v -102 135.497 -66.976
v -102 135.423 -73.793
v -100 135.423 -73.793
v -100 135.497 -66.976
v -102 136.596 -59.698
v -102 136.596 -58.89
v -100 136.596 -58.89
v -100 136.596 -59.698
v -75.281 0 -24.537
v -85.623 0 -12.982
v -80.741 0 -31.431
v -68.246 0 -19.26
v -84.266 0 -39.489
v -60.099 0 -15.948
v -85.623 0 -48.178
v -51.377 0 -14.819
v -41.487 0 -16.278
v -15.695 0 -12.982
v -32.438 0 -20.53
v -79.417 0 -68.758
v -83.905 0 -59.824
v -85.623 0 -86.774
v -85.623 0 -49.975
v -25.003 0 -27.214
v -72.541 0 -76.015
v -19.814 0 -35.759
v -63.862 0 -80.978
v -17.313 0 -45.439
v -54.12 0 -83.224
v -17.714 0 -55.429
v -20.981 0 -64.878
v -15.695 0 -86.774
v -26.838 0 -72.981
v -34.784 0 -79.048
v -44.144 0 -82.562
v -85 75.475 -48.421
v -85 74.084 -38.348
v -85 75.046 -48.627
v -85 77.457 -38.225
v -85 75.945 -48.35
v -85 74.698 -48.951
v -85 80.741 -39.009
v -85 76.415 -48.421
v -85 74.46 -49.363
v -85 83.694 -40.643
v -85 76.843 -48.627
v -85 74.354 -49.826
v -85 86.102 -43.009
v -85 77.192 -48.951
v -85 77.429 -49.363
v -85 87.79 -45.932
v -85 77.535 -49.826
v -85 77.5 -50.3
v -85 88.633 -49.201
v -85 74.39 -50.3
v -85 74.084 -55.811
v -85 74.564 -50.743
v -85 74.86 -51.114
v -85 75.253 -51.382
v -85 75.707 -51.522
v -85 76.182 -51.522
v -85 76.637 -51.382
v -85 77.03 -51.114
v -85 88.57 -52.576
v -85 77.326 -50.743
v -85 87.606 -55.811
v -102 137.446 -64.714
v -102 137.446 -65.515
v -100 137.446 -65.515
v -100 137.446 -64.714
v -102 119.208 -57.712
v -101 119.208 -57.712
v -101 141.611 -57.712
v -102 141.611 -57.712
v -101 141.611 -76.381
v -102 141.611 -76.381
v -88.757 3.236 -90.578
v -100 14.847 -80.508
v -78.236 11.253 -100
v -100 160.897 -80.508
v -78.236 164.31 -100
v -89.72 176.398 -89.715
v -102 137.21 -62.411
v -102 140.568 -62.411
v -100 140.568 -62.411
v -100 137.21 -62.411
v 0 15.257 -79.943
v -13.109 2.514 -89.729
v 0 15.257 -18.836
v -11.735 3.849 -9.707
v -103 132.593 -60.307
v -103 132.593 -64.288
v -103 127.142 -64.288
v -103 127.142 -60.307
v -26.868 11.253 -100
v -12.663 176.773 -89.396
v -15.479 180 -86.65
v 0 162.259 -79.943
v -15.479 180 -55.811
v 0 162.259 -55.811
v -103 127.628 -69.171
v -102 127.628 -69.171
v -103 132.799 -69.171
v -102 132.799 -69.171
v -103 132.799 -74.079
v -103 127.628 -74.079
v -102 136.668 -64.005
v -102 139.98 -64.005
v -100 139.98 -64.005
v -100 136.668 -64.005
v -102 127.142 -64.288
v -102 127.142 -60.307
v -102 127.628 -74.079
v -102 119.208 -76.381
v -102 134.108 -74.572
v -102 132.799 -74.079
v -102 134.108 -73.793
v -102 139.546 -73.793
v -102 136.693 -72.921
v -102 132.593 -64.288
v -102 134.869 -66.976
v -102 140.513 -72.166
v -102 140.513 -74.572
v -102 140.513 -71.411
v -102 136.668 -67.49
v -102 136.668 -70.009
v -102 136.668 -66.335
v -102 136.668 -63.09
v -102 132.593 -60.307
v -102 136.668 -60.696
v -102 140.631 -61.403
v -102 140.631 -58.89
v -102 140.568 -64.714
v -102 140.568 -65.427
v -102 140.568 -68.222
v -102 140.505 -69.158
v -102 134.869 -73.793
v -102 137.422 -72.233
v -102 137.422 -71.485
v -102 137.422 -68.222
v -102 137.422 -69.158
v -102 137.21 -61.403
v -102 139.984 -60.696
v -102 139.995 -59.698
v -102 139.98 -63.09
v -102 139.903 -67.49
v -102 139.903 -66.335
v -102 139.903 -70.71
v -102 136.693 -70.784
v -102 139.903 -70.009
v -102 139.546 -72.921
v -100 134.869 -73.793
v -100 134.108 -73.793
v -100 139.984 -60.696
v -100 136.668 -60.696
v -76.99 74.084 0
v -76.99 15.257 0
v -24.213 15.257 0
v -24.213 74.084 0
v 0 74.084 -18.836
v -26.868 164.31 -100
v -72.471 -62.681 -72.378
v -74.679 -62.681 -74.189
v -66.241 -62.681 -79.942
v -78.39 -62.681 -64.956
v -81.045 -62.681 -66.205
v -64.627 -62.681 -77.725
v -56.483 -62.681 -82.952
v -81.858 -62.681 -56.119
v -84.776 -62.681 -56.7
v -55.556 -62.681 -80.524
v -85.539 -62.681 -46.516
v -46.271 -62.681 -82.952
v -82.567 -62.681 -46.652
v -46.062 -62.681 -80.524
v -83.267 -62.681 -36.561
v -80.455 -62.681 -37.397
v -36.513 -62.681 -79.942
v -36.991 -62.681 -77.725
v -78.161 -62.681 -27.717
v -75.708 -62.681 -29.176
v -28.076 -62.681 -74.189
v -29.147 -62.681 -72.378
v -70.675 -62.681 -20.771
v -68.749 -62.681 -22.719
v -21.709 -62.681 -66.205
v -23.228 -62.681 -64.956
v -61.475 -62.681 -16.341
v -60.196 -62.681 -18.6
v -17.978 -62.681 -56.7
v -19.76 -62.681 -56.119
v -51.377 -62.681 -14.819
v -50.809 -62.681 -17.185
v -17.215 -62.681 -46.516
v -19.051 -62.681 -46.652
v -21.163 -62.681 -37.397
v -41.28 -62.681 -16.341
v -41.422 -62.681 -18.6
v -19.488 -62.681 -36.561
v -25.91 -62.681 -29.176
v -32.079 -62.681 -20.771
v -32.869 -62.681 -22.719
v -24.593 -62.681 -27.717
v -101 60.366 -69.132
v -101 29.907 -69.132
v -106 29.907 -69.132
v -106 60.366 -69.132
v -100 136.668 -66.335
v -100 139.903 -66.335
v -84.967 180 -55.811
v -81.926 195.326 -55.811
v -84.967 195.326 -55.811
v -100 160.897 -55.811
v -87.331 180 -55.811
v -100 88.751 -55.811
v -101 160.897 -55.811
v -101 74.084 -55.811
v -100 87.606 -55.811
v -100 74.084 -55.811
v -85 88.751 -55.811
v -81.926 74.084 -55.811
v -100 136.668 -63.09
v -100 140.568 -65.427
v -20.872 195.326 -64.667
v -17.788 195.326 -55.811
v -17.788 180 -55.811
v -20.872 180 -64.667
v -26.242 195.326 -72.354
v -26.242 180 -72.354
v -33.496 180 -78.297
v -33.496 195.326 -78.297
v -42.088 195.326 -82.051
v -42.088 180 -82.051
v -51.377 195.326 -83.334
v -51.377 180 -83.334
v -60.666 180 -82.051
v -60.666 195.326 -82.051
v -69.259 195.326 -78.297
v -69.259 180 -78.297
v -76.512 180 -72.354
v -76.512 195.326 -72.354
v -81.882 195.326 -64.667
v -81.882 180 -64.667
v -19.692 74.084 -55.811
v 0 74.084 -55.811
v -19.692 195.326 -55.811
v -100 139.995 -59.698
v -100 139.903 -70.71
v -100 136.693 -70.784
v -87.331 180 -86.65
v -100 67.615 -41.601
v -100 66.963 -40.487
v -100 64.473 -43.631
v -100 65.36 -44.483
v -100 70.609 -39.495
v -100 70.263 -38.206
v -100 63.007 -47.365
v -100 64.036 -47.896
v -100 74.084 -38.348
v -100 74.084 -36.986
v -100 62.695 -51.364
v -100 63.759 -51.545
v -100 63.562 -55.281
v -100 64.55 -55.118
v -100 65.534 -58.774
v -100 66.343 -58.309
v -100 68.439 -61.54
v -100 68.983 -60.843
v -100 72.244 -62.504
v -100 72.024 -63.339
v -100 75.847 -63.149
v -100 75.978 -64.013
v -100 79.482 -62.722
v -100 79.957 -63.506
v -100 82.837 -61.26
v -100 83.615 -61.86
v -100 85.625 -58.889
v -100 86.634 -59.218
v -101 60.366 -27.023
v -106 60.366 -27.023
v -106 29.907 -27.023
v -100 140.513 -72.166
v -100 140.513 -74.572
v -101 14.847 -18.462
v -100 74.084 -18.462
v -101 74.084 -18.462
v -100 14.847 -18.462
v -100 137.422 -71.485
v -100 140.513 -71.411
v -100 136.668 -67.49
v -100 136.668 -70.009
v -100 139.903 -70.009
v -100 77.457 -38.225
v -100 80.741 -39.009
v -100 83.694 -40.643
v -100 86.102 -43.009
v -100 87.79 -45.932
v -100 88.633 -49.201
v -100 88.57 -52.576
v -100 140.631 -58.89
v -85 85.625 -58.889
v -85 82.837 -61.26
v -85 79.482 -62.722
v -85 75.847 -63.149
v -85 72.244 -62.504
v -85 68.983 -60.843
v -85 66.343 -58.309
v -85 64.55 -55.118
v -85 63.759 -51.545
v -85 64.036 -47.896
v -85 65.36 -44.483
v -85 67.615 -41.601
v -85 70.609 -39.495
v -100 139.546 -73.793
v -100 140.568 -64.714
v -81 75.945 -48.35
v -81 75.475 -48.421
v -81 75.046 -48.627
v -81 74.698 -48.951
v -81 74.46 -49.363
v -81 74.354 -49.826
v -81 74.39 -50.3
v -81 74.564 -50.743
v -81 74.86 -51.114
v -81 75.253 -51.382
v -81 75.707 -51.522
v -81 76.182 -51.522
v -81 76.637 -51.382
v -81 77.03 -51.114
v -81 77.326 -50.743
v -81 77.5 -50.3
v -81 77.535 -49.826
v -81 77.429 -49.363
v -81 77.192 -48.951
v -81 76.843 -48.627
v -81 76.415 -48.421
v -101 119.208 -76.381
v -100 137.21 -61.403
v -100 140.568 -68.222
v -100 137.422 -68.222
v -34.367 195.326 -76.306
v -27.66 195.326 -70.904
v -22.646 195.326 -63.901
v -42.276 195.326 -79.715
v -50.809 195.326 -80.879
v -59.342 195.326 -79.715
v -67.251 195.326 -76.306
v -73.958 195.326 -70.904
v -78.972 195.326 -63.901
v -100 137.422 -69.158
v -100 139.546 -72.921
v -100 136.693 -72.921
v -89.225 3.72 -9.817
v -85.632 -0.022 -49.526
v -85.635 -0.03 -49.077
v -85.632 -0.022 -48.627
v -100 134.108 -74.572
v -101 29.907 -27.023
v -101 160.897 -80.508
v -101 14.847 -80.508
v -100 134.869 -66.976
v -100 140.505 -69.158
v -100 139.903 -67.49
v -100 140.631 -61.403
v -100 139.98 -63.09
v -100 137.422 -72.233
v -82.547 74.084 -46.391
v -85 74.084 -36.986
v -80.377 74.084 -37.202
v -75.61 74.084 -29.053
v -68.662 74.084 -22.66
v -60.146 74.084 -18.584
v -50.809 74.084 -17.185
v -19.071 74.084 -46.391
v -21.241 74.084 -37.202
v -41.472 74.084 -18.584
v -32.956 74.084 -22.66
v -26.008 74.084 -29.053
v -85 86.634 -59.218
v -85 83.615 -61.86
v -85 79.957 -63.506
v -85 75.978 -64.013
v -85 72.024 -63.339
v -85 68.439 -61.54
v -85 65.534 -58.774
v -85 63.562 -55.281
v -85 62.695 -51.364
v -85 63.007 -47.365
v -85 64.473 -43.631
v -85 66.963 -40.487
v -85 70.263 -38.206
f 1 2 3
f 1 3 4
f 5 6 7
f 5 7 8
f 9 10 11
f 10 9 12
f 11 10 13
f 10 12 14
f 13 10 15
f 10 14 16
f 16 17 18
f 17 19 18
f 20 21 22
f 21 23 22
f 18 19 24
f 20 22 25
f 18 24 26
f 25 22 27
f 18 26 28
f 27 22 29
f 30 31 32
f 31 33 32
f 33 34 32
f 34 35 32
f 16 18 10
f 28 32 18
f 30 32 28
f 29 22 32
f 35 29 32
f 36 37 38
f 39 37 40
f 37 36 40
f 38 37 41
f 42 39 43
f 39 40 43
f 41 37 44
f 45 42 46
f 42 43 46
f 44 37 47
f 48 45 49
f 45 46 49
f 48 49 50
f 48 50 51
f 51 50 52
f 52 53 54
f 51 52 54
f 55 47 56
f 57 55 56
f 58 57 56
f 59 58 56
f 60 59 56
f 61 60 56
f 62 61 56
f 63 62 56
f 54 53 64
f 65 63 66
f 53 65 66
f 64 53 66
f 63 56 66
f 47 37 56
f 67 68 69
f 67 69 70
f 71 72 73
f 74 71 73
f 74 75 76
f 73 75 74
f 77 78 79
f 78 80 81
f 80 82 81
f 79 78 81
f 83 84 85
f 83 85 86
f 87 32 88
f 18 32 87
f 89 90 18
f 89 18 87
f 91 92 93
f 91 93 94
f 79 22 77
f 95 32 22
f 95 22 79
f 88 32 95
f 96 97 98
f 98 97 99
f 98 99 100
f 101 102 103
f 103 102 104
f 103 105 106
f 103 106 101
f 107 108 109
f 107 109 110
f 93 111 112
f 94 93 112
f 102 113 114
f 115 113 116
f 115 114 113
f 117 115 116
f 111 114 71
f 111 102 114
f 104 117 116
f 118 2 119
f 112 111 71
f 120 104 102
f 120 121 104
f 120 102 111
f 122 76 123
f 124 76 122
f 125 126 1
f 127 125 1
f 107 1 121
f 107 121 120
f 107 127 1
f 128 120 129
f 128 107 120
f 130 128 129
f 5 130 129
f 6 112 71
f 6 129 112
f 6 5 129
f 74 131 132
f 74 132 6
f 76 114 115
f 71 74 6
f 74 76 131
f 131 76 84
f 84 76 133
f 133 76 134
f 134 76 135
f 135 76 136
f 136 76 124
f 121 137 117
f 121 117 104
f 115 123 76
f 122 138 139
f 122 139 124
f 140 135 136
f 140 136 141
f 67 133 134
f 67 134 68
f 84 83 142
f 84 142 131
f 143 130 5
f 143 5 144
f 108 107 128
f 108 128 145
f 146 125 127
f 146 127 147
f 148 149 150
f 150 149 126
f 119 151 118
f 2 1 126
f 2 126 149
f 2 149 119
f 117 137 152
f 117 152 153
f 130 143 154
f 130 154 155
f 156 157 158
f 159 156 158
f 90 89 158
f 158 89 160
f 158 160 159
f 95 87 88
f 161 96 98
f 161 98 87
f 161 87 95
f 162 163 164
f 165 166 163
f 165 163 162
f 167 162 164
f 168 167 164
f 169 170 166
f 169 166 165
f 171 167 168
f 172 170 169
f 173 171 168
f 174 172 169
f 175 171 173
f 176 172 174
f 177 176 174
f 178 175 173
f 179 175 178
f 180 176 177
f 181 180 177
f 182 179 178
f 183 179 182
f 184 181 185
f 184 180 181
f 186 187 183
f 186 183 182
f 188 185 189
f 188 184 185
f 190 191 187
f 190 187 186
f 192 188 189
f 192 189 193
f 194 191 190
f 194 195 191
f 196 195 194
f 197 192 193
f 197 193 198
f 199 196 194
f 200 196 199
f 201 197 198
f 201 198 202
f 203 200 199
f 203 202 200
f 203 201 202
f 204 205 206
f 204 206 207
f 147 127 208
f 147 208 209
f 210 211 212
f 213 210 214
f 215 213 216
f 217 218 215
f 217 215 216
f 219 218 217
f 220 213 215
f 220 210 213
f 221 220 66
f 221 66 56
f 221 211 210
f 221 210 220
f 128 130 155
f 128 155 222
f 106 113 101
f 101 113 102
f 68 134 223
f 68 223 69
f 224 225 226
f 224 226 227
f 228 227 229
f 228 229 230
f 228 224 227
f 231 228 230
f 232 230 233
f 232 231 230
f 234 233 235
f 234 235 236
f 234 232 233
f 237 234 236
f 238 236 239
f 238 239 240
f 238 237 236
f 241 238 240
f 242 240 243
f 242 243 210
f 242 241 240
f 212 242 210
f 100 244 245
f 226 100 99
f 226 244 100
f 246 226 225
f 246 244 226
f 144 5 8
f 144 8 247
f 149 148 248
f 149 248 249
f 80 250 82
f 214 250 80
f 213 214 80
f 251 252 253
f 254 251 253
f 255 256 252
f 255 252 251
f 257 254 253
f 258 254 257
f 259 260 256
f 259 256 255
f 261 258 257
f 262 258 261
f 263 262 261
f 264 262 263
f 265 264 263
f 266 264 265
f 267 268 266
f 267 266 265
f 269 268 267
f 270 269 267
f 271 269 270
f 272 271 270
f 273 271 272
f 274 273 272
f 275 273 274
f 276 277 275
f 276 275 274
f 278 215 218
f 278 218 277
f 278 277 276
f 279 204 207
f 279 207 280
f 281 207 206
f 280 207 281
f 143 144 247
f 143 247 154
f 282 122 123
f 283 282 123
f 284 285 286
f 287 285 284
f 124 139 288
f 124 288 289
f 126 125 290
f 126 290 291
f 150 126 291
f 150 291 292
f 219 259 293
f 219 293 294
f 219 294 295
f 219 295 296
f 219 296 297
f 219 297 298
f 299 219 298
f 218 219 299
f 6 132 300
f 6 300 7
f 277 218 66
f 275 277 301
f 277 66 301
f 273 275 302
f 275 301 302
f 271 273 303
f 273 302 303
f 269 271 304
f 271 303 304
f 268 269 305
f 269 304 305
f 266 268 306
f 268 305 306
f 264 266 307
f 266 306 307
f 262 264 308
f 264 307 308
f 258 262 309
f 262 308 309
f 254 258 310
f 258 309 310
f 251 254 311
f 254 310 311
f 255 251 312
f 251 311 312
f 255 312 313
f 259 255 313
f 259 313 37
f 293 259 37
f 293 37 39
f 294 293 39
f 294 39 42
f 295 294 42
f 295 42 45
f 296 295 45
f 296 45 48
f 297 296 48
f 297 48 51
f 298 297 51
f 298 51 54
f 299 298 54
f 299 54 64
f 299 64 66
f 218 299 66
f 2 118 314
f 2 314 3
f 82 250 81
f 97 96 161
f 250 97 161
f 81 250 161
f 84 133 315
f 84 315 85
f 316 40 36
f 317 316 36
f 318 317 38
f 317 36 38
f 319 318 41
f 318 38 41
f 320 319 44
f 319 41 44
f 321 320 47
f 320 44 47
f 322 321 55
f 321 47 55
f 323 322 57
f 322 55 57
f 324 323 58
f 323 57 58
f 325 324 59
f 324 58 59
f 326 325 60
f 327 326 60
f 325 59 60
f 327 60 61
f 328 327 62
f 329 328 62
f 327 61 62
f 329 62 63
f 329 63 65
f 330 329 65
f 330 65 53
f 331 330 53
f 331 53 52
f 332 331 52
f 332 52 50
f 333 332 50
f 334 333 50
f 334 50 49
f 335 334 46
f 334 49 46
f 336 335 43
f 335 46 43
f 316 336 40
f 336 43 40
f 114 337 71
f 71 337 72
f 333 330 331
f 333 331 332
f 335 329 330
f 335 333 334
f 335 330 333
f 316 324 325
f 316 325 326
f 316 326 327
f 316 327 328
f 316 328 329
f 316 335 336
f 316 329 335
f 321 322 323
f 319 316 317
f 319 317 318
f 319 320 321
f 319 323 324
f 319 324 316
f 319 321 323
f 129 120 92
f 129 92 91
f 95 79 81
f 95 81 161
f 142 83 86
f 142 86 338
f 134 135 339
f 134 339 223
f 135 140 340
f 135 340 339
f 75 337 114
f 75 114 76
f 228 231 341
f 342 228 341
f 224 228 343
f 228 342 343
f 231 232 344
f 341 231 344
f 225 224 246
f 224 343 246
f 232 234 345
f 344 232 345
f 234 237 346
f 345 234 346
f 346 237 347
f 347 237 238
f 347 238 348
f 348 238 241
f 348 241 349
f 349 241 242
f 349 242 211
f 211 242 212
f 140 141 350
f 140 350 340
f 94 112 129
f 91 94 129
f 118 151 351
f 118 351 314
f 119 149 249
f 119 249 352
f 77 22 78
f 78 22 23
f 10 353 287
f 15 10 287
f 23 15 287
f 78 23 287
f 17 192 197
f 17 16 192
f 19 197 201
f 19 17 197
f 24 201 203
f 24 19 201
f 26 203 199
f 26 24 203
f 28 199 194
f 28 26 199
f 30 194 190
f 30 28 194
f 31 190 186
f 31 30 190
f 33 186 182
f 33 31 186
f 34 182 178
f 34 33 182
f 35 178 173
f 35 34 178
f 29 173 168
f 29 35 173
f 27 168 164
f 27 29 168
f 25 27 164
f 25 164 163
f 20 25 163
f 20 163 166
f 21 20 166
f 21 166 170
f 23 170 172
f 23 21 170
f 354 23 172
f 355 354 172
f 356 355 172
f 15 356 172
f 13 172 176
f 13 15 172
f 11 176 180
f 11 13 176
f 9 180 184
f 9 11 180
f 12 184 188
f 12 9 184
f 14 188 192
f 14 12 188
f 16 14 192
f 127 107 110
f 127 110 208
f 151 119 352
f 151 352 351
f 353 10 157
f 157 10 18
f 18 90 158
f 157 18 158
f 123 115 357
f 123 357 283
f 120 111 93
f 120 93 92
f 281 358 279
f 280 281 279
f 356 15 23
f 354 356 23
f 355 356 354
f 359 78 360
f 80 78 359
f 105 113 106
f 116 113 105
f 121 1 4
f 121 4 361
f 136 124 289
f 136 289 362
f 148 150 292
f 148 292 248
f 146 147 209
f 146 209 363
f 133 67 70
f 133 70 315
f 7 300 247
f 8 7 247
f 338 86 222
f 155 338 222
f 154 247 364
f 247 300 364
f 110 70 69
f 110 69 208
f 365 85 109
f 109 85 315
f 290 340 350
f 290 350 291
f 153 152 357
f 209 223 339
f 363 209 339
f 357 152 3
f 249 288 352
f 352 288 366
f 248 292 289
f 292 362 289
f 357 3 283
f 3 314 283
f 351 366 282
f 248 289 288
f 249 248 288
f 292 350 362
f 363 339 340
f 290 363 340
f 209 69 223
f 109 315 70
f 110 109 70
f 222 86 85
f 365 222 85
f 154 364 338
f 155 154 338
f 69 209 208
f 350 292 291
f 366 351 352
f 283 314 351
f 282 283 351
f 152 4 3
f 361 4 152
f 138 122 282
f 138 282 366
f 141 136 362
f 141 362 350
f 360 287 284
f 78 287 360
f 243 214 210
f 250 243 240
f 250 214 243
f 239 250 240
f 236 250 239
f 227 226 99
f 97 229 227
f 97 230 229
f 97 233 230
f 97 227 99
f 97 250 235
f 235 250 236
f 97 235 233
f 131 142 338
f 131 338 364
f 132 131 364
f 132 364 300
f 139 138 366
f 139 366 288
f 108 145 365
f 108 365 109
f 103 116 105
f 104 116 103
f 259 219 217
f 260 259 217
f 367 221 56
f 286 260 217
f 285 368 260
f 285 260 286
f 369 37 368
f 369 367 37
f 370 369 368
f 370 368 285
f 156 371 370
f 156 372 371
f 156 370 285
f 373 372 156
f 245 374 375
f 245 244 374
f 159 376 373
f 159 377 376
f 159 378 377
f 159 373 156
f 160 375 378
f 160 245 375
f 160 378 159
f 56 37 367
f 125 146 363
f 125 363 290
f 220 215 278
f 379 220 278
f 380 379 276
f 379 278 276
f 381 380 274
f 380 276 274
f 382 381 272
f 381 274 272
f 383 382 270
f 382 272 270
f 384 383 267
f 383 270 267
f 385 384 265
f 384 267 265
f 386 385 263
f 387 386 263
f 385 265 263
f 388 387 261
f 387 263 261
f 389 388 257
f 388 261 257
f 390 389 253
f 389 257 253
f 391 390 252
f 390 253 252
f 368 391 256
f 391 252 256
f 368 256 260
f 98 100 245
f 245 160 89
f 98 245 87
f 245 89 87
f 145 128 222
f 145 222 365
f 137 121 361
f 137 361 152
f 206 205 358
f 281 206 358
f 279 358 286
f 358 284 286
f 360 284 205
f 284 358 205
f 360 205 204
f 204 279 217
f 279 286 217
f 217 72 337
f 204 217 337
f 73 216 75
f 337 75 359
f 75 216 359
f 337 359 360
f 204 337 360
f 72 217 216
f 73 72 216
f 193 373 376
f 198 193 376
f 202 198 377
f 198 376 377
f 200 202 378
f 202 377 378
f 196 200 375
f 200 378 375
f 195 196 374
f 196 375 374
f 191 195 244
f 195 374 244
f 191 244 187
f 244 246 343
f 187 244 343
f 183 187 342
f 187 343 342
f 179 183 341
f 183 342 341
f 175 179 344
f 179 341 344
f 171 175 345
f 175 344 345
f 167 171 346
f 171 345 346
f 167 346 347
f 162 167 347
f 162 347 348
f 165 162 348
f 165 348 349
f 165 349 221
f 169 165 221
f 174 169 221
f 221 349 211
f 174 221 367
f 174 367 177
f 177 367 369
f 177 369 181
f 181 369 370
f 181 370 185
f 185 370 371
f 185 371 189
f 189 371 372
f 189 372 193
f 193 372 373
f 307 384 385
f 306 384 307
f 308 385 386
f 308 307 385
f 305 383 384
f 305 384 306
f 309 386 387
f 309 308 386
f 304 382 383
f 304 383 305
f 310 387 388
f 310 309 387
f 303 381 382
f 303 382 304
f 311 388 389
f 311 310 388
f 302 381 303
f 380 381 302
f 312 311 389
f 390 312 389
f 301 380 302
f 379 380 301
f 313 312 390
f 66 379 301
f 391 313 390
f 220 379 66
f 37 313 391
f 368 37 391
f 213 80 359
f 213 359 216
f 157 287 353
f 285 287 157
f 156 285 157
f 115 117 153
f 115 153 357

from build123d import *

# Parameters (mm, degrees)
SKETCH1_W           = 100
SKETCH1_H           = 100
BOSS_EXTRUDE1_DEPTH = 180
SKETCH2_R           = 34.257790197
BOSS_EXTRUDE2_DEPTH = 350
SKETCH3_W           = 152.006357392
SKETCH3_H           = 282.452416457
CUT_EXTRUDE2_DEPTH  = 400
CUT_EXTRUDE3_DEPTH  = 400
CUT_EXTRUDE4_DEPTH  = 400
CUT_EXTRUDE5_DEPTH  = 400
SKETCH7_W           = 160.159381639
SKETCH7_H           = 147.362276113
CUT_EXTRUDE6_DEPTH  = 400
SKETCH8_W           = 147.310744502
SKETCH8_H           = 162.038906966
CUT_EXTRUDE7_DEPTH  = 400
SKETCH9_R           = 31.847293423
CUT_EXTRUDE8_DEPTH  = 400
SKETCH10_W          = 140.220962397
SKETCH10_H          = 212.033531124
CUT_EXTRUDE9_DEPTH  = 400
SKETCH11_R          = 13.603137886
CUT_EXTRUDE11_DEPTH = 15
SKETCH12_R          = 12.495422516
BOSS_EXTRUDE3_DEPTH = 15
SKETCH13_R          = 1.594865099
BOSS_EXTRUDE4_DEPTH = 4
SKETCH14_W          = 100.74862993
SKETCH14_H          = 110.555003588
CUT_EXTRUDE13_DEPTH = 400
BOSS_EXTRUDE5_DEPTH = 1
SKETCH16_W          = 42.108585165
SKETCH16_H          = 30.458347221
BOSS_EXTRUDE6_DEPTH = 5
SKETCH17_W          = 18.669530869
SKETCH17_H          = 22.4027039
BOSS_EXTRUDE7_DEPTH = 1
SKETCH18_W          = 4.907623399
SKETCH18_H          = 5.170746831
SKETCH18_W_2        = 3.981473695
SKETCH18_H_2        = 5.451349552
BOSS_EXTRUDE8_DEPTH = 1
CUT_EXTRUDE14_DEPTH = 2


with BuildPart() as part:
    # Sketch1 → Boss-Extrude1 (new body)
    with BuildSketch(Plane(origin=(0, 0, 0), x_dir=(1, 0, 0), z_dir=(0, 1, 0))):
        with Locations((-50, 50)):
            Rectangle(SKETCH1_W, SKETCH1_H)
    extrude(amount=BOSS_EXTRUDE1_DEPTH)

    # Sketch2 → Boss-Extrude2 (add, symmetric)
    with BuildSketch(Plane(origin=(0, 180, 0), x_dir=(1, 0, 0), z_dir=(0, 1, 0))):
        with Locations(Location((-51.377291833, 49.076536384, 0), (0, 0, 270))):
            Circle(SKETCH2_R)
    extrude(amount=BOSS_EXTRUDE2_DEPTH, both=True)

    # Sketch3 → Cut-Extrude2 (cut)
    with BuildSketch(Plane(origin=(0, 0, 0), x_dir=(0, 0, -1), z_dir=(1, 0, 0))):
        with Locations((57.419900112, 502.274302507)):
            Rectangle(SKETCH3_W, SKETCH3_H)
    extrude(amount=-CUT_EXTRUDE2_DEPTH, mode=Mode.SUBTRACT)

    # Sketch4 → Cut-Extrude3 (cut)
    with BuildSketch(Plane(origin=(0, 0, 0), x_dir=(0, 0, -1), z_dir=(1, 0, 0))):
        Polygon((12.981970869, 0), (-8.994244796, 25.828096003), (-18.564506014, -15.259465835), align=None)
        Polygon((85.072517936, -1.448103984), (109.237639161, 19.113145112), (115.920034239, -3.267382694), align=None)
        Polygon((12.981970869, 180), (-8.994244796, 148.537596011), (-15.418178585, 193.219274892), align=None)
        Polygon((85.072517936, 181.854312784), (103.841225373, 159.795920888), (106.132549481, 198.647393934), align=None)
    extrude(amount=-CUT_EXTRUDE3_DEPTH, mode=Mode.SUBTRACT)

    # Sketch5 → Cut-Extrude4 (cut)
    with BuildSketch(Plane.XY):
        Polygon((-85.623287335, 0), (-106.370377984, 21.426392531), (-122.288861874, 3.209259887), (-93.526345261, -19.884701759), align=None)
        Polygon((-15.694988751, 0), (0, 15.257385304), (12.122677088, 15.257385304), (10.563067769, -19.884701759), align=None)
        Polygon((-87.166490339, 180.248071029), (-106.370377984, 151.29108453), (-117.705469457, 200.501115102), align=None)
        Polygon((-15.694988751, 180.248071029), (7.833767065, 153.279557508), (0, 193.941208308), align=None)
    extrude(amount=-CUT_EXTRUDE4_DEPTH, mode=Mode.SUBTRACT)

    # Sketch6 → Cut-Extrude5 (cut)
    with BuildSketch(Plane(origin=(0, 180, 0), x_dir=(1, 0, 0), z_dir=(0, 1, 0))):
        Polygon((-112.386997555, 28.400400964), (-64.261264503, -10.212759359), (-84.406366528, -15.51192827), (-124.649689542, -15.51192827), align=None)
        Polygon((-97.065537028, 135.861756084), (-119.37552445, 77.792688888), (-118.043343626, 64.347606737), (-66.428694172, 110.575168787), align=None)
        Polygon((-24.69640689, -21.815840769), (11.092108798, -8.97361337), (17.428316417, 32.393768119), (-38.531576846, -11.139157378), align=None)
        Polygon((-17.445484601, 140.804394854), (35.417473102, 107.262520599), (9.305452855, 72.996438725), (-31.724385352, 103.625272537), align=None)
    extrude(amount=-CUT_EXTRUDE5_DEPTH, mode=Mode.SUBTRACT)

    # Sketch7 → Cut-Extrude6 (cut)
    with BuildSketch(Plane.XY):
        with Locations((-66.123258915, -136.36252694)):
            Rectangle(SKETCH7_W, SKETCH7_H)
    extrude(amount=-CUT_EXTRUDE6_DEPTH, mode=Mode.SUBTRACT)

    # Sketch8 → Cut-Extrude7 (cut)
    with BuildSketch(Plane.XY):
        with Locations((-53.541153336, 332.448287589)):
            Rectangle(SKETCH8_W, SKETCH8_H)
    extrude(amount=-CUT_EXTRUDE7_DEPTH, mode=Mode.SUBTRACT)

    # Sketch9 → Cut-Extrude8 (cut)
    with BuildSketch(Plane(origin=(0, 251.428834106, 0), x_dir=(1, 0, 0), z_dir=(0, 1, 0))):
        with Locations(Location((-50.808993157, 49.032036374, 0), (0, 0, 270))):
            Circle(SKETCH9_R)
    extrude(amount=-CUT_EXTRUDE8_DEPTH, mode=Mode.SUBTRACT)

    # Sketch10 → Cut-Extrude9 (cut)
    with BuildSketch(Plane.ZY.offset(100)):
        with Locations((14.299084536, 180.100625535)):
            Rectangle(SKETCH10_W, SKETCH10_H)
    extrude(amount=-CUT_EXTRUDE9_DEPTH, mode=Mode.SUBTRACT)

    # Sketch11 → Cut-Extrude11 (cut)
    with BuildSketch(Plane.ZY.offset(100)):
        with Locations((-50.413251954, 76.264646142)):
            Circle(SKETCH11_R)
    extrude(amount=-CUT_EXTRUDE11_DEPTH, mode=Mode.SUBTRACT)

    # Sketch12 → Boss-Extrude3 (add)
    with BuildSketch(Plane.ZY.offset(85)):
        with Locations(Location((-50.658800768, 76.222522328, 0), (0, 0, 114.353089558))):
            Circle(SKETCH12_R)
    extrude(amount=BOSS_EXTRUDE3_DEPTH)

    # Sketch13 → Boss-Extrude4 (add)
    with BuildSketch(Plane(origin=(-85, 0, 0), x_dir=(0, 0, -1), z_dir=(1, 0, 0))):
        with Locations(Location((49.945205578, 75.944780088, 0), (0, 0, 180))):
            Circle(SKETCH13_R)
    extrude(amount=BOSS_EXTRUDE4_DEPTH)

    # Sketch14 → Cut-Extrude13 (cut)
    with BuildSketch(Plane.ZY.offset(100)):
        with Locations((-65.350029467, 250.603414818)):
            Rectangle(SKETCH14_W, SKETCH14_H)
    extrude(amount=-CUT_EXTRUDE13_DEPTH, mode=Mode.SUBTRACT)

    # Sketch15 → Boss-Extrude5 (add)
    with BuildSketch(Plane.ZY.offset(100)):
        Polygon((-18.461827727, 14.847435435), (-80.507743362, 14.847435435), (-80.507743362, 160.896793159), (-55.811396663, 160.896793159), (-55.811396663, 74.083859973), (-18.461827727, 74.083859973), align=None)
    extrude(amount=BOSS_EXTRUDE5_DEPTH)

    # Sketch16 → Boss-Extrude6 (add)
    with BuildSketch(Plane.ZY.offset(101)):
        with Locations((-48.07732297, 45.136437142)):
            Rectangle(SKETCH16_W, SKETCH16_H)
    extrude(amount=BOSS_EXTRUDE6_DEPTH)

    # Sketch17 → Boss-Extrude7 (add)
    with BuildSketch(Plane.ZY.offset(101)):
        with Locations((-67.04663872, 130.409241603)):
            Rectangle(SKETCH17_W, SKETCH17_H)
    extrude(amount=BOSS_EXTRUDE7_DEPTH)

    # Sketch18 → Boss-Extrude8 (add)
    with BuildSketch(Plane.ZY.offset(102)):
        with Locations((-71.625108618, 130.213401885)):
            Rectangle(SKETCH18_W, SKETCH18_H)
        with Locations((-62.297675883, 129.867186512)):
            Rectangle(SKETCH18_W_2, SKETCH18_H_2)
    extrude(amount=BOSS_EXTRUDE8_DEPTH)

    # Sketch19 → Cut-Extrude14 (cut)
    with BuildSketch(Plane.ZY.offset(102)):
        Polygon((-66.976455081, 134.868836652), (-73.7929295, 134.868836652), (-73.7929295, 134.108269479), (-74.571872104, 134.108269479), (-74.571872104, 140.512729543), (-73.7929295, 140.512729543), (-72.165965418, 140.512729543), (-72.233411796, 137.421948277), (-71.48458153, 137.421948277), (-71.410861795, 140.512729543), (-69.158339735, 140.504865112), (-69.158339735, 137.421948277), (-68.22174926, 137.421948277), (-68.22174926, 140.567922793), (-65.426885805, 140.567922793), (-65.515241968, 137.446210948), (-64.714122339, 137.446210948), (-64.714122339, 140.567922793), (-62.410871788, 140.567922793), (-62.410871788, 137.210126003), (-61.403493639, 137.210126003), (-61.403493639, 140.631129361), (-58.889974549, 140.631129361), (-58.889974549, 136.595539338), (-59.698319644, 136.595539338), (-59.698319644, 139.99489006), (-60.695848378, 139.984078324), (-60.695848378, 136.667717235), (-63.090112056, 136.667717235), (-63.090112056, 139.979723883), (-64.00479018, 139.979723883), (-64.00479018, 136.667717235), (-66.334605538, 136.667717235), (-66.334605538, 139.902697072), (-67.48995239, 139.902697072), (-67.48995239, 136.667717235), (-70.008746759, 136.667717235), (-70.008746759, 139.902697072), (-70.709698815, 139.902697072), (-70.783897489, 136.693128041), (-72.921241048, 136.693128041), (-72.921241048, 139.545601992), (-73.7929295, 139.545601992), (-73.7929295, 135.423339258), (-66.976455081, 135.49721976), align=None)
    extrude(amount=-CUT_EXTRUDE14_DEPTH, mode=Mode.SUBTRACT)


solid = part.part
